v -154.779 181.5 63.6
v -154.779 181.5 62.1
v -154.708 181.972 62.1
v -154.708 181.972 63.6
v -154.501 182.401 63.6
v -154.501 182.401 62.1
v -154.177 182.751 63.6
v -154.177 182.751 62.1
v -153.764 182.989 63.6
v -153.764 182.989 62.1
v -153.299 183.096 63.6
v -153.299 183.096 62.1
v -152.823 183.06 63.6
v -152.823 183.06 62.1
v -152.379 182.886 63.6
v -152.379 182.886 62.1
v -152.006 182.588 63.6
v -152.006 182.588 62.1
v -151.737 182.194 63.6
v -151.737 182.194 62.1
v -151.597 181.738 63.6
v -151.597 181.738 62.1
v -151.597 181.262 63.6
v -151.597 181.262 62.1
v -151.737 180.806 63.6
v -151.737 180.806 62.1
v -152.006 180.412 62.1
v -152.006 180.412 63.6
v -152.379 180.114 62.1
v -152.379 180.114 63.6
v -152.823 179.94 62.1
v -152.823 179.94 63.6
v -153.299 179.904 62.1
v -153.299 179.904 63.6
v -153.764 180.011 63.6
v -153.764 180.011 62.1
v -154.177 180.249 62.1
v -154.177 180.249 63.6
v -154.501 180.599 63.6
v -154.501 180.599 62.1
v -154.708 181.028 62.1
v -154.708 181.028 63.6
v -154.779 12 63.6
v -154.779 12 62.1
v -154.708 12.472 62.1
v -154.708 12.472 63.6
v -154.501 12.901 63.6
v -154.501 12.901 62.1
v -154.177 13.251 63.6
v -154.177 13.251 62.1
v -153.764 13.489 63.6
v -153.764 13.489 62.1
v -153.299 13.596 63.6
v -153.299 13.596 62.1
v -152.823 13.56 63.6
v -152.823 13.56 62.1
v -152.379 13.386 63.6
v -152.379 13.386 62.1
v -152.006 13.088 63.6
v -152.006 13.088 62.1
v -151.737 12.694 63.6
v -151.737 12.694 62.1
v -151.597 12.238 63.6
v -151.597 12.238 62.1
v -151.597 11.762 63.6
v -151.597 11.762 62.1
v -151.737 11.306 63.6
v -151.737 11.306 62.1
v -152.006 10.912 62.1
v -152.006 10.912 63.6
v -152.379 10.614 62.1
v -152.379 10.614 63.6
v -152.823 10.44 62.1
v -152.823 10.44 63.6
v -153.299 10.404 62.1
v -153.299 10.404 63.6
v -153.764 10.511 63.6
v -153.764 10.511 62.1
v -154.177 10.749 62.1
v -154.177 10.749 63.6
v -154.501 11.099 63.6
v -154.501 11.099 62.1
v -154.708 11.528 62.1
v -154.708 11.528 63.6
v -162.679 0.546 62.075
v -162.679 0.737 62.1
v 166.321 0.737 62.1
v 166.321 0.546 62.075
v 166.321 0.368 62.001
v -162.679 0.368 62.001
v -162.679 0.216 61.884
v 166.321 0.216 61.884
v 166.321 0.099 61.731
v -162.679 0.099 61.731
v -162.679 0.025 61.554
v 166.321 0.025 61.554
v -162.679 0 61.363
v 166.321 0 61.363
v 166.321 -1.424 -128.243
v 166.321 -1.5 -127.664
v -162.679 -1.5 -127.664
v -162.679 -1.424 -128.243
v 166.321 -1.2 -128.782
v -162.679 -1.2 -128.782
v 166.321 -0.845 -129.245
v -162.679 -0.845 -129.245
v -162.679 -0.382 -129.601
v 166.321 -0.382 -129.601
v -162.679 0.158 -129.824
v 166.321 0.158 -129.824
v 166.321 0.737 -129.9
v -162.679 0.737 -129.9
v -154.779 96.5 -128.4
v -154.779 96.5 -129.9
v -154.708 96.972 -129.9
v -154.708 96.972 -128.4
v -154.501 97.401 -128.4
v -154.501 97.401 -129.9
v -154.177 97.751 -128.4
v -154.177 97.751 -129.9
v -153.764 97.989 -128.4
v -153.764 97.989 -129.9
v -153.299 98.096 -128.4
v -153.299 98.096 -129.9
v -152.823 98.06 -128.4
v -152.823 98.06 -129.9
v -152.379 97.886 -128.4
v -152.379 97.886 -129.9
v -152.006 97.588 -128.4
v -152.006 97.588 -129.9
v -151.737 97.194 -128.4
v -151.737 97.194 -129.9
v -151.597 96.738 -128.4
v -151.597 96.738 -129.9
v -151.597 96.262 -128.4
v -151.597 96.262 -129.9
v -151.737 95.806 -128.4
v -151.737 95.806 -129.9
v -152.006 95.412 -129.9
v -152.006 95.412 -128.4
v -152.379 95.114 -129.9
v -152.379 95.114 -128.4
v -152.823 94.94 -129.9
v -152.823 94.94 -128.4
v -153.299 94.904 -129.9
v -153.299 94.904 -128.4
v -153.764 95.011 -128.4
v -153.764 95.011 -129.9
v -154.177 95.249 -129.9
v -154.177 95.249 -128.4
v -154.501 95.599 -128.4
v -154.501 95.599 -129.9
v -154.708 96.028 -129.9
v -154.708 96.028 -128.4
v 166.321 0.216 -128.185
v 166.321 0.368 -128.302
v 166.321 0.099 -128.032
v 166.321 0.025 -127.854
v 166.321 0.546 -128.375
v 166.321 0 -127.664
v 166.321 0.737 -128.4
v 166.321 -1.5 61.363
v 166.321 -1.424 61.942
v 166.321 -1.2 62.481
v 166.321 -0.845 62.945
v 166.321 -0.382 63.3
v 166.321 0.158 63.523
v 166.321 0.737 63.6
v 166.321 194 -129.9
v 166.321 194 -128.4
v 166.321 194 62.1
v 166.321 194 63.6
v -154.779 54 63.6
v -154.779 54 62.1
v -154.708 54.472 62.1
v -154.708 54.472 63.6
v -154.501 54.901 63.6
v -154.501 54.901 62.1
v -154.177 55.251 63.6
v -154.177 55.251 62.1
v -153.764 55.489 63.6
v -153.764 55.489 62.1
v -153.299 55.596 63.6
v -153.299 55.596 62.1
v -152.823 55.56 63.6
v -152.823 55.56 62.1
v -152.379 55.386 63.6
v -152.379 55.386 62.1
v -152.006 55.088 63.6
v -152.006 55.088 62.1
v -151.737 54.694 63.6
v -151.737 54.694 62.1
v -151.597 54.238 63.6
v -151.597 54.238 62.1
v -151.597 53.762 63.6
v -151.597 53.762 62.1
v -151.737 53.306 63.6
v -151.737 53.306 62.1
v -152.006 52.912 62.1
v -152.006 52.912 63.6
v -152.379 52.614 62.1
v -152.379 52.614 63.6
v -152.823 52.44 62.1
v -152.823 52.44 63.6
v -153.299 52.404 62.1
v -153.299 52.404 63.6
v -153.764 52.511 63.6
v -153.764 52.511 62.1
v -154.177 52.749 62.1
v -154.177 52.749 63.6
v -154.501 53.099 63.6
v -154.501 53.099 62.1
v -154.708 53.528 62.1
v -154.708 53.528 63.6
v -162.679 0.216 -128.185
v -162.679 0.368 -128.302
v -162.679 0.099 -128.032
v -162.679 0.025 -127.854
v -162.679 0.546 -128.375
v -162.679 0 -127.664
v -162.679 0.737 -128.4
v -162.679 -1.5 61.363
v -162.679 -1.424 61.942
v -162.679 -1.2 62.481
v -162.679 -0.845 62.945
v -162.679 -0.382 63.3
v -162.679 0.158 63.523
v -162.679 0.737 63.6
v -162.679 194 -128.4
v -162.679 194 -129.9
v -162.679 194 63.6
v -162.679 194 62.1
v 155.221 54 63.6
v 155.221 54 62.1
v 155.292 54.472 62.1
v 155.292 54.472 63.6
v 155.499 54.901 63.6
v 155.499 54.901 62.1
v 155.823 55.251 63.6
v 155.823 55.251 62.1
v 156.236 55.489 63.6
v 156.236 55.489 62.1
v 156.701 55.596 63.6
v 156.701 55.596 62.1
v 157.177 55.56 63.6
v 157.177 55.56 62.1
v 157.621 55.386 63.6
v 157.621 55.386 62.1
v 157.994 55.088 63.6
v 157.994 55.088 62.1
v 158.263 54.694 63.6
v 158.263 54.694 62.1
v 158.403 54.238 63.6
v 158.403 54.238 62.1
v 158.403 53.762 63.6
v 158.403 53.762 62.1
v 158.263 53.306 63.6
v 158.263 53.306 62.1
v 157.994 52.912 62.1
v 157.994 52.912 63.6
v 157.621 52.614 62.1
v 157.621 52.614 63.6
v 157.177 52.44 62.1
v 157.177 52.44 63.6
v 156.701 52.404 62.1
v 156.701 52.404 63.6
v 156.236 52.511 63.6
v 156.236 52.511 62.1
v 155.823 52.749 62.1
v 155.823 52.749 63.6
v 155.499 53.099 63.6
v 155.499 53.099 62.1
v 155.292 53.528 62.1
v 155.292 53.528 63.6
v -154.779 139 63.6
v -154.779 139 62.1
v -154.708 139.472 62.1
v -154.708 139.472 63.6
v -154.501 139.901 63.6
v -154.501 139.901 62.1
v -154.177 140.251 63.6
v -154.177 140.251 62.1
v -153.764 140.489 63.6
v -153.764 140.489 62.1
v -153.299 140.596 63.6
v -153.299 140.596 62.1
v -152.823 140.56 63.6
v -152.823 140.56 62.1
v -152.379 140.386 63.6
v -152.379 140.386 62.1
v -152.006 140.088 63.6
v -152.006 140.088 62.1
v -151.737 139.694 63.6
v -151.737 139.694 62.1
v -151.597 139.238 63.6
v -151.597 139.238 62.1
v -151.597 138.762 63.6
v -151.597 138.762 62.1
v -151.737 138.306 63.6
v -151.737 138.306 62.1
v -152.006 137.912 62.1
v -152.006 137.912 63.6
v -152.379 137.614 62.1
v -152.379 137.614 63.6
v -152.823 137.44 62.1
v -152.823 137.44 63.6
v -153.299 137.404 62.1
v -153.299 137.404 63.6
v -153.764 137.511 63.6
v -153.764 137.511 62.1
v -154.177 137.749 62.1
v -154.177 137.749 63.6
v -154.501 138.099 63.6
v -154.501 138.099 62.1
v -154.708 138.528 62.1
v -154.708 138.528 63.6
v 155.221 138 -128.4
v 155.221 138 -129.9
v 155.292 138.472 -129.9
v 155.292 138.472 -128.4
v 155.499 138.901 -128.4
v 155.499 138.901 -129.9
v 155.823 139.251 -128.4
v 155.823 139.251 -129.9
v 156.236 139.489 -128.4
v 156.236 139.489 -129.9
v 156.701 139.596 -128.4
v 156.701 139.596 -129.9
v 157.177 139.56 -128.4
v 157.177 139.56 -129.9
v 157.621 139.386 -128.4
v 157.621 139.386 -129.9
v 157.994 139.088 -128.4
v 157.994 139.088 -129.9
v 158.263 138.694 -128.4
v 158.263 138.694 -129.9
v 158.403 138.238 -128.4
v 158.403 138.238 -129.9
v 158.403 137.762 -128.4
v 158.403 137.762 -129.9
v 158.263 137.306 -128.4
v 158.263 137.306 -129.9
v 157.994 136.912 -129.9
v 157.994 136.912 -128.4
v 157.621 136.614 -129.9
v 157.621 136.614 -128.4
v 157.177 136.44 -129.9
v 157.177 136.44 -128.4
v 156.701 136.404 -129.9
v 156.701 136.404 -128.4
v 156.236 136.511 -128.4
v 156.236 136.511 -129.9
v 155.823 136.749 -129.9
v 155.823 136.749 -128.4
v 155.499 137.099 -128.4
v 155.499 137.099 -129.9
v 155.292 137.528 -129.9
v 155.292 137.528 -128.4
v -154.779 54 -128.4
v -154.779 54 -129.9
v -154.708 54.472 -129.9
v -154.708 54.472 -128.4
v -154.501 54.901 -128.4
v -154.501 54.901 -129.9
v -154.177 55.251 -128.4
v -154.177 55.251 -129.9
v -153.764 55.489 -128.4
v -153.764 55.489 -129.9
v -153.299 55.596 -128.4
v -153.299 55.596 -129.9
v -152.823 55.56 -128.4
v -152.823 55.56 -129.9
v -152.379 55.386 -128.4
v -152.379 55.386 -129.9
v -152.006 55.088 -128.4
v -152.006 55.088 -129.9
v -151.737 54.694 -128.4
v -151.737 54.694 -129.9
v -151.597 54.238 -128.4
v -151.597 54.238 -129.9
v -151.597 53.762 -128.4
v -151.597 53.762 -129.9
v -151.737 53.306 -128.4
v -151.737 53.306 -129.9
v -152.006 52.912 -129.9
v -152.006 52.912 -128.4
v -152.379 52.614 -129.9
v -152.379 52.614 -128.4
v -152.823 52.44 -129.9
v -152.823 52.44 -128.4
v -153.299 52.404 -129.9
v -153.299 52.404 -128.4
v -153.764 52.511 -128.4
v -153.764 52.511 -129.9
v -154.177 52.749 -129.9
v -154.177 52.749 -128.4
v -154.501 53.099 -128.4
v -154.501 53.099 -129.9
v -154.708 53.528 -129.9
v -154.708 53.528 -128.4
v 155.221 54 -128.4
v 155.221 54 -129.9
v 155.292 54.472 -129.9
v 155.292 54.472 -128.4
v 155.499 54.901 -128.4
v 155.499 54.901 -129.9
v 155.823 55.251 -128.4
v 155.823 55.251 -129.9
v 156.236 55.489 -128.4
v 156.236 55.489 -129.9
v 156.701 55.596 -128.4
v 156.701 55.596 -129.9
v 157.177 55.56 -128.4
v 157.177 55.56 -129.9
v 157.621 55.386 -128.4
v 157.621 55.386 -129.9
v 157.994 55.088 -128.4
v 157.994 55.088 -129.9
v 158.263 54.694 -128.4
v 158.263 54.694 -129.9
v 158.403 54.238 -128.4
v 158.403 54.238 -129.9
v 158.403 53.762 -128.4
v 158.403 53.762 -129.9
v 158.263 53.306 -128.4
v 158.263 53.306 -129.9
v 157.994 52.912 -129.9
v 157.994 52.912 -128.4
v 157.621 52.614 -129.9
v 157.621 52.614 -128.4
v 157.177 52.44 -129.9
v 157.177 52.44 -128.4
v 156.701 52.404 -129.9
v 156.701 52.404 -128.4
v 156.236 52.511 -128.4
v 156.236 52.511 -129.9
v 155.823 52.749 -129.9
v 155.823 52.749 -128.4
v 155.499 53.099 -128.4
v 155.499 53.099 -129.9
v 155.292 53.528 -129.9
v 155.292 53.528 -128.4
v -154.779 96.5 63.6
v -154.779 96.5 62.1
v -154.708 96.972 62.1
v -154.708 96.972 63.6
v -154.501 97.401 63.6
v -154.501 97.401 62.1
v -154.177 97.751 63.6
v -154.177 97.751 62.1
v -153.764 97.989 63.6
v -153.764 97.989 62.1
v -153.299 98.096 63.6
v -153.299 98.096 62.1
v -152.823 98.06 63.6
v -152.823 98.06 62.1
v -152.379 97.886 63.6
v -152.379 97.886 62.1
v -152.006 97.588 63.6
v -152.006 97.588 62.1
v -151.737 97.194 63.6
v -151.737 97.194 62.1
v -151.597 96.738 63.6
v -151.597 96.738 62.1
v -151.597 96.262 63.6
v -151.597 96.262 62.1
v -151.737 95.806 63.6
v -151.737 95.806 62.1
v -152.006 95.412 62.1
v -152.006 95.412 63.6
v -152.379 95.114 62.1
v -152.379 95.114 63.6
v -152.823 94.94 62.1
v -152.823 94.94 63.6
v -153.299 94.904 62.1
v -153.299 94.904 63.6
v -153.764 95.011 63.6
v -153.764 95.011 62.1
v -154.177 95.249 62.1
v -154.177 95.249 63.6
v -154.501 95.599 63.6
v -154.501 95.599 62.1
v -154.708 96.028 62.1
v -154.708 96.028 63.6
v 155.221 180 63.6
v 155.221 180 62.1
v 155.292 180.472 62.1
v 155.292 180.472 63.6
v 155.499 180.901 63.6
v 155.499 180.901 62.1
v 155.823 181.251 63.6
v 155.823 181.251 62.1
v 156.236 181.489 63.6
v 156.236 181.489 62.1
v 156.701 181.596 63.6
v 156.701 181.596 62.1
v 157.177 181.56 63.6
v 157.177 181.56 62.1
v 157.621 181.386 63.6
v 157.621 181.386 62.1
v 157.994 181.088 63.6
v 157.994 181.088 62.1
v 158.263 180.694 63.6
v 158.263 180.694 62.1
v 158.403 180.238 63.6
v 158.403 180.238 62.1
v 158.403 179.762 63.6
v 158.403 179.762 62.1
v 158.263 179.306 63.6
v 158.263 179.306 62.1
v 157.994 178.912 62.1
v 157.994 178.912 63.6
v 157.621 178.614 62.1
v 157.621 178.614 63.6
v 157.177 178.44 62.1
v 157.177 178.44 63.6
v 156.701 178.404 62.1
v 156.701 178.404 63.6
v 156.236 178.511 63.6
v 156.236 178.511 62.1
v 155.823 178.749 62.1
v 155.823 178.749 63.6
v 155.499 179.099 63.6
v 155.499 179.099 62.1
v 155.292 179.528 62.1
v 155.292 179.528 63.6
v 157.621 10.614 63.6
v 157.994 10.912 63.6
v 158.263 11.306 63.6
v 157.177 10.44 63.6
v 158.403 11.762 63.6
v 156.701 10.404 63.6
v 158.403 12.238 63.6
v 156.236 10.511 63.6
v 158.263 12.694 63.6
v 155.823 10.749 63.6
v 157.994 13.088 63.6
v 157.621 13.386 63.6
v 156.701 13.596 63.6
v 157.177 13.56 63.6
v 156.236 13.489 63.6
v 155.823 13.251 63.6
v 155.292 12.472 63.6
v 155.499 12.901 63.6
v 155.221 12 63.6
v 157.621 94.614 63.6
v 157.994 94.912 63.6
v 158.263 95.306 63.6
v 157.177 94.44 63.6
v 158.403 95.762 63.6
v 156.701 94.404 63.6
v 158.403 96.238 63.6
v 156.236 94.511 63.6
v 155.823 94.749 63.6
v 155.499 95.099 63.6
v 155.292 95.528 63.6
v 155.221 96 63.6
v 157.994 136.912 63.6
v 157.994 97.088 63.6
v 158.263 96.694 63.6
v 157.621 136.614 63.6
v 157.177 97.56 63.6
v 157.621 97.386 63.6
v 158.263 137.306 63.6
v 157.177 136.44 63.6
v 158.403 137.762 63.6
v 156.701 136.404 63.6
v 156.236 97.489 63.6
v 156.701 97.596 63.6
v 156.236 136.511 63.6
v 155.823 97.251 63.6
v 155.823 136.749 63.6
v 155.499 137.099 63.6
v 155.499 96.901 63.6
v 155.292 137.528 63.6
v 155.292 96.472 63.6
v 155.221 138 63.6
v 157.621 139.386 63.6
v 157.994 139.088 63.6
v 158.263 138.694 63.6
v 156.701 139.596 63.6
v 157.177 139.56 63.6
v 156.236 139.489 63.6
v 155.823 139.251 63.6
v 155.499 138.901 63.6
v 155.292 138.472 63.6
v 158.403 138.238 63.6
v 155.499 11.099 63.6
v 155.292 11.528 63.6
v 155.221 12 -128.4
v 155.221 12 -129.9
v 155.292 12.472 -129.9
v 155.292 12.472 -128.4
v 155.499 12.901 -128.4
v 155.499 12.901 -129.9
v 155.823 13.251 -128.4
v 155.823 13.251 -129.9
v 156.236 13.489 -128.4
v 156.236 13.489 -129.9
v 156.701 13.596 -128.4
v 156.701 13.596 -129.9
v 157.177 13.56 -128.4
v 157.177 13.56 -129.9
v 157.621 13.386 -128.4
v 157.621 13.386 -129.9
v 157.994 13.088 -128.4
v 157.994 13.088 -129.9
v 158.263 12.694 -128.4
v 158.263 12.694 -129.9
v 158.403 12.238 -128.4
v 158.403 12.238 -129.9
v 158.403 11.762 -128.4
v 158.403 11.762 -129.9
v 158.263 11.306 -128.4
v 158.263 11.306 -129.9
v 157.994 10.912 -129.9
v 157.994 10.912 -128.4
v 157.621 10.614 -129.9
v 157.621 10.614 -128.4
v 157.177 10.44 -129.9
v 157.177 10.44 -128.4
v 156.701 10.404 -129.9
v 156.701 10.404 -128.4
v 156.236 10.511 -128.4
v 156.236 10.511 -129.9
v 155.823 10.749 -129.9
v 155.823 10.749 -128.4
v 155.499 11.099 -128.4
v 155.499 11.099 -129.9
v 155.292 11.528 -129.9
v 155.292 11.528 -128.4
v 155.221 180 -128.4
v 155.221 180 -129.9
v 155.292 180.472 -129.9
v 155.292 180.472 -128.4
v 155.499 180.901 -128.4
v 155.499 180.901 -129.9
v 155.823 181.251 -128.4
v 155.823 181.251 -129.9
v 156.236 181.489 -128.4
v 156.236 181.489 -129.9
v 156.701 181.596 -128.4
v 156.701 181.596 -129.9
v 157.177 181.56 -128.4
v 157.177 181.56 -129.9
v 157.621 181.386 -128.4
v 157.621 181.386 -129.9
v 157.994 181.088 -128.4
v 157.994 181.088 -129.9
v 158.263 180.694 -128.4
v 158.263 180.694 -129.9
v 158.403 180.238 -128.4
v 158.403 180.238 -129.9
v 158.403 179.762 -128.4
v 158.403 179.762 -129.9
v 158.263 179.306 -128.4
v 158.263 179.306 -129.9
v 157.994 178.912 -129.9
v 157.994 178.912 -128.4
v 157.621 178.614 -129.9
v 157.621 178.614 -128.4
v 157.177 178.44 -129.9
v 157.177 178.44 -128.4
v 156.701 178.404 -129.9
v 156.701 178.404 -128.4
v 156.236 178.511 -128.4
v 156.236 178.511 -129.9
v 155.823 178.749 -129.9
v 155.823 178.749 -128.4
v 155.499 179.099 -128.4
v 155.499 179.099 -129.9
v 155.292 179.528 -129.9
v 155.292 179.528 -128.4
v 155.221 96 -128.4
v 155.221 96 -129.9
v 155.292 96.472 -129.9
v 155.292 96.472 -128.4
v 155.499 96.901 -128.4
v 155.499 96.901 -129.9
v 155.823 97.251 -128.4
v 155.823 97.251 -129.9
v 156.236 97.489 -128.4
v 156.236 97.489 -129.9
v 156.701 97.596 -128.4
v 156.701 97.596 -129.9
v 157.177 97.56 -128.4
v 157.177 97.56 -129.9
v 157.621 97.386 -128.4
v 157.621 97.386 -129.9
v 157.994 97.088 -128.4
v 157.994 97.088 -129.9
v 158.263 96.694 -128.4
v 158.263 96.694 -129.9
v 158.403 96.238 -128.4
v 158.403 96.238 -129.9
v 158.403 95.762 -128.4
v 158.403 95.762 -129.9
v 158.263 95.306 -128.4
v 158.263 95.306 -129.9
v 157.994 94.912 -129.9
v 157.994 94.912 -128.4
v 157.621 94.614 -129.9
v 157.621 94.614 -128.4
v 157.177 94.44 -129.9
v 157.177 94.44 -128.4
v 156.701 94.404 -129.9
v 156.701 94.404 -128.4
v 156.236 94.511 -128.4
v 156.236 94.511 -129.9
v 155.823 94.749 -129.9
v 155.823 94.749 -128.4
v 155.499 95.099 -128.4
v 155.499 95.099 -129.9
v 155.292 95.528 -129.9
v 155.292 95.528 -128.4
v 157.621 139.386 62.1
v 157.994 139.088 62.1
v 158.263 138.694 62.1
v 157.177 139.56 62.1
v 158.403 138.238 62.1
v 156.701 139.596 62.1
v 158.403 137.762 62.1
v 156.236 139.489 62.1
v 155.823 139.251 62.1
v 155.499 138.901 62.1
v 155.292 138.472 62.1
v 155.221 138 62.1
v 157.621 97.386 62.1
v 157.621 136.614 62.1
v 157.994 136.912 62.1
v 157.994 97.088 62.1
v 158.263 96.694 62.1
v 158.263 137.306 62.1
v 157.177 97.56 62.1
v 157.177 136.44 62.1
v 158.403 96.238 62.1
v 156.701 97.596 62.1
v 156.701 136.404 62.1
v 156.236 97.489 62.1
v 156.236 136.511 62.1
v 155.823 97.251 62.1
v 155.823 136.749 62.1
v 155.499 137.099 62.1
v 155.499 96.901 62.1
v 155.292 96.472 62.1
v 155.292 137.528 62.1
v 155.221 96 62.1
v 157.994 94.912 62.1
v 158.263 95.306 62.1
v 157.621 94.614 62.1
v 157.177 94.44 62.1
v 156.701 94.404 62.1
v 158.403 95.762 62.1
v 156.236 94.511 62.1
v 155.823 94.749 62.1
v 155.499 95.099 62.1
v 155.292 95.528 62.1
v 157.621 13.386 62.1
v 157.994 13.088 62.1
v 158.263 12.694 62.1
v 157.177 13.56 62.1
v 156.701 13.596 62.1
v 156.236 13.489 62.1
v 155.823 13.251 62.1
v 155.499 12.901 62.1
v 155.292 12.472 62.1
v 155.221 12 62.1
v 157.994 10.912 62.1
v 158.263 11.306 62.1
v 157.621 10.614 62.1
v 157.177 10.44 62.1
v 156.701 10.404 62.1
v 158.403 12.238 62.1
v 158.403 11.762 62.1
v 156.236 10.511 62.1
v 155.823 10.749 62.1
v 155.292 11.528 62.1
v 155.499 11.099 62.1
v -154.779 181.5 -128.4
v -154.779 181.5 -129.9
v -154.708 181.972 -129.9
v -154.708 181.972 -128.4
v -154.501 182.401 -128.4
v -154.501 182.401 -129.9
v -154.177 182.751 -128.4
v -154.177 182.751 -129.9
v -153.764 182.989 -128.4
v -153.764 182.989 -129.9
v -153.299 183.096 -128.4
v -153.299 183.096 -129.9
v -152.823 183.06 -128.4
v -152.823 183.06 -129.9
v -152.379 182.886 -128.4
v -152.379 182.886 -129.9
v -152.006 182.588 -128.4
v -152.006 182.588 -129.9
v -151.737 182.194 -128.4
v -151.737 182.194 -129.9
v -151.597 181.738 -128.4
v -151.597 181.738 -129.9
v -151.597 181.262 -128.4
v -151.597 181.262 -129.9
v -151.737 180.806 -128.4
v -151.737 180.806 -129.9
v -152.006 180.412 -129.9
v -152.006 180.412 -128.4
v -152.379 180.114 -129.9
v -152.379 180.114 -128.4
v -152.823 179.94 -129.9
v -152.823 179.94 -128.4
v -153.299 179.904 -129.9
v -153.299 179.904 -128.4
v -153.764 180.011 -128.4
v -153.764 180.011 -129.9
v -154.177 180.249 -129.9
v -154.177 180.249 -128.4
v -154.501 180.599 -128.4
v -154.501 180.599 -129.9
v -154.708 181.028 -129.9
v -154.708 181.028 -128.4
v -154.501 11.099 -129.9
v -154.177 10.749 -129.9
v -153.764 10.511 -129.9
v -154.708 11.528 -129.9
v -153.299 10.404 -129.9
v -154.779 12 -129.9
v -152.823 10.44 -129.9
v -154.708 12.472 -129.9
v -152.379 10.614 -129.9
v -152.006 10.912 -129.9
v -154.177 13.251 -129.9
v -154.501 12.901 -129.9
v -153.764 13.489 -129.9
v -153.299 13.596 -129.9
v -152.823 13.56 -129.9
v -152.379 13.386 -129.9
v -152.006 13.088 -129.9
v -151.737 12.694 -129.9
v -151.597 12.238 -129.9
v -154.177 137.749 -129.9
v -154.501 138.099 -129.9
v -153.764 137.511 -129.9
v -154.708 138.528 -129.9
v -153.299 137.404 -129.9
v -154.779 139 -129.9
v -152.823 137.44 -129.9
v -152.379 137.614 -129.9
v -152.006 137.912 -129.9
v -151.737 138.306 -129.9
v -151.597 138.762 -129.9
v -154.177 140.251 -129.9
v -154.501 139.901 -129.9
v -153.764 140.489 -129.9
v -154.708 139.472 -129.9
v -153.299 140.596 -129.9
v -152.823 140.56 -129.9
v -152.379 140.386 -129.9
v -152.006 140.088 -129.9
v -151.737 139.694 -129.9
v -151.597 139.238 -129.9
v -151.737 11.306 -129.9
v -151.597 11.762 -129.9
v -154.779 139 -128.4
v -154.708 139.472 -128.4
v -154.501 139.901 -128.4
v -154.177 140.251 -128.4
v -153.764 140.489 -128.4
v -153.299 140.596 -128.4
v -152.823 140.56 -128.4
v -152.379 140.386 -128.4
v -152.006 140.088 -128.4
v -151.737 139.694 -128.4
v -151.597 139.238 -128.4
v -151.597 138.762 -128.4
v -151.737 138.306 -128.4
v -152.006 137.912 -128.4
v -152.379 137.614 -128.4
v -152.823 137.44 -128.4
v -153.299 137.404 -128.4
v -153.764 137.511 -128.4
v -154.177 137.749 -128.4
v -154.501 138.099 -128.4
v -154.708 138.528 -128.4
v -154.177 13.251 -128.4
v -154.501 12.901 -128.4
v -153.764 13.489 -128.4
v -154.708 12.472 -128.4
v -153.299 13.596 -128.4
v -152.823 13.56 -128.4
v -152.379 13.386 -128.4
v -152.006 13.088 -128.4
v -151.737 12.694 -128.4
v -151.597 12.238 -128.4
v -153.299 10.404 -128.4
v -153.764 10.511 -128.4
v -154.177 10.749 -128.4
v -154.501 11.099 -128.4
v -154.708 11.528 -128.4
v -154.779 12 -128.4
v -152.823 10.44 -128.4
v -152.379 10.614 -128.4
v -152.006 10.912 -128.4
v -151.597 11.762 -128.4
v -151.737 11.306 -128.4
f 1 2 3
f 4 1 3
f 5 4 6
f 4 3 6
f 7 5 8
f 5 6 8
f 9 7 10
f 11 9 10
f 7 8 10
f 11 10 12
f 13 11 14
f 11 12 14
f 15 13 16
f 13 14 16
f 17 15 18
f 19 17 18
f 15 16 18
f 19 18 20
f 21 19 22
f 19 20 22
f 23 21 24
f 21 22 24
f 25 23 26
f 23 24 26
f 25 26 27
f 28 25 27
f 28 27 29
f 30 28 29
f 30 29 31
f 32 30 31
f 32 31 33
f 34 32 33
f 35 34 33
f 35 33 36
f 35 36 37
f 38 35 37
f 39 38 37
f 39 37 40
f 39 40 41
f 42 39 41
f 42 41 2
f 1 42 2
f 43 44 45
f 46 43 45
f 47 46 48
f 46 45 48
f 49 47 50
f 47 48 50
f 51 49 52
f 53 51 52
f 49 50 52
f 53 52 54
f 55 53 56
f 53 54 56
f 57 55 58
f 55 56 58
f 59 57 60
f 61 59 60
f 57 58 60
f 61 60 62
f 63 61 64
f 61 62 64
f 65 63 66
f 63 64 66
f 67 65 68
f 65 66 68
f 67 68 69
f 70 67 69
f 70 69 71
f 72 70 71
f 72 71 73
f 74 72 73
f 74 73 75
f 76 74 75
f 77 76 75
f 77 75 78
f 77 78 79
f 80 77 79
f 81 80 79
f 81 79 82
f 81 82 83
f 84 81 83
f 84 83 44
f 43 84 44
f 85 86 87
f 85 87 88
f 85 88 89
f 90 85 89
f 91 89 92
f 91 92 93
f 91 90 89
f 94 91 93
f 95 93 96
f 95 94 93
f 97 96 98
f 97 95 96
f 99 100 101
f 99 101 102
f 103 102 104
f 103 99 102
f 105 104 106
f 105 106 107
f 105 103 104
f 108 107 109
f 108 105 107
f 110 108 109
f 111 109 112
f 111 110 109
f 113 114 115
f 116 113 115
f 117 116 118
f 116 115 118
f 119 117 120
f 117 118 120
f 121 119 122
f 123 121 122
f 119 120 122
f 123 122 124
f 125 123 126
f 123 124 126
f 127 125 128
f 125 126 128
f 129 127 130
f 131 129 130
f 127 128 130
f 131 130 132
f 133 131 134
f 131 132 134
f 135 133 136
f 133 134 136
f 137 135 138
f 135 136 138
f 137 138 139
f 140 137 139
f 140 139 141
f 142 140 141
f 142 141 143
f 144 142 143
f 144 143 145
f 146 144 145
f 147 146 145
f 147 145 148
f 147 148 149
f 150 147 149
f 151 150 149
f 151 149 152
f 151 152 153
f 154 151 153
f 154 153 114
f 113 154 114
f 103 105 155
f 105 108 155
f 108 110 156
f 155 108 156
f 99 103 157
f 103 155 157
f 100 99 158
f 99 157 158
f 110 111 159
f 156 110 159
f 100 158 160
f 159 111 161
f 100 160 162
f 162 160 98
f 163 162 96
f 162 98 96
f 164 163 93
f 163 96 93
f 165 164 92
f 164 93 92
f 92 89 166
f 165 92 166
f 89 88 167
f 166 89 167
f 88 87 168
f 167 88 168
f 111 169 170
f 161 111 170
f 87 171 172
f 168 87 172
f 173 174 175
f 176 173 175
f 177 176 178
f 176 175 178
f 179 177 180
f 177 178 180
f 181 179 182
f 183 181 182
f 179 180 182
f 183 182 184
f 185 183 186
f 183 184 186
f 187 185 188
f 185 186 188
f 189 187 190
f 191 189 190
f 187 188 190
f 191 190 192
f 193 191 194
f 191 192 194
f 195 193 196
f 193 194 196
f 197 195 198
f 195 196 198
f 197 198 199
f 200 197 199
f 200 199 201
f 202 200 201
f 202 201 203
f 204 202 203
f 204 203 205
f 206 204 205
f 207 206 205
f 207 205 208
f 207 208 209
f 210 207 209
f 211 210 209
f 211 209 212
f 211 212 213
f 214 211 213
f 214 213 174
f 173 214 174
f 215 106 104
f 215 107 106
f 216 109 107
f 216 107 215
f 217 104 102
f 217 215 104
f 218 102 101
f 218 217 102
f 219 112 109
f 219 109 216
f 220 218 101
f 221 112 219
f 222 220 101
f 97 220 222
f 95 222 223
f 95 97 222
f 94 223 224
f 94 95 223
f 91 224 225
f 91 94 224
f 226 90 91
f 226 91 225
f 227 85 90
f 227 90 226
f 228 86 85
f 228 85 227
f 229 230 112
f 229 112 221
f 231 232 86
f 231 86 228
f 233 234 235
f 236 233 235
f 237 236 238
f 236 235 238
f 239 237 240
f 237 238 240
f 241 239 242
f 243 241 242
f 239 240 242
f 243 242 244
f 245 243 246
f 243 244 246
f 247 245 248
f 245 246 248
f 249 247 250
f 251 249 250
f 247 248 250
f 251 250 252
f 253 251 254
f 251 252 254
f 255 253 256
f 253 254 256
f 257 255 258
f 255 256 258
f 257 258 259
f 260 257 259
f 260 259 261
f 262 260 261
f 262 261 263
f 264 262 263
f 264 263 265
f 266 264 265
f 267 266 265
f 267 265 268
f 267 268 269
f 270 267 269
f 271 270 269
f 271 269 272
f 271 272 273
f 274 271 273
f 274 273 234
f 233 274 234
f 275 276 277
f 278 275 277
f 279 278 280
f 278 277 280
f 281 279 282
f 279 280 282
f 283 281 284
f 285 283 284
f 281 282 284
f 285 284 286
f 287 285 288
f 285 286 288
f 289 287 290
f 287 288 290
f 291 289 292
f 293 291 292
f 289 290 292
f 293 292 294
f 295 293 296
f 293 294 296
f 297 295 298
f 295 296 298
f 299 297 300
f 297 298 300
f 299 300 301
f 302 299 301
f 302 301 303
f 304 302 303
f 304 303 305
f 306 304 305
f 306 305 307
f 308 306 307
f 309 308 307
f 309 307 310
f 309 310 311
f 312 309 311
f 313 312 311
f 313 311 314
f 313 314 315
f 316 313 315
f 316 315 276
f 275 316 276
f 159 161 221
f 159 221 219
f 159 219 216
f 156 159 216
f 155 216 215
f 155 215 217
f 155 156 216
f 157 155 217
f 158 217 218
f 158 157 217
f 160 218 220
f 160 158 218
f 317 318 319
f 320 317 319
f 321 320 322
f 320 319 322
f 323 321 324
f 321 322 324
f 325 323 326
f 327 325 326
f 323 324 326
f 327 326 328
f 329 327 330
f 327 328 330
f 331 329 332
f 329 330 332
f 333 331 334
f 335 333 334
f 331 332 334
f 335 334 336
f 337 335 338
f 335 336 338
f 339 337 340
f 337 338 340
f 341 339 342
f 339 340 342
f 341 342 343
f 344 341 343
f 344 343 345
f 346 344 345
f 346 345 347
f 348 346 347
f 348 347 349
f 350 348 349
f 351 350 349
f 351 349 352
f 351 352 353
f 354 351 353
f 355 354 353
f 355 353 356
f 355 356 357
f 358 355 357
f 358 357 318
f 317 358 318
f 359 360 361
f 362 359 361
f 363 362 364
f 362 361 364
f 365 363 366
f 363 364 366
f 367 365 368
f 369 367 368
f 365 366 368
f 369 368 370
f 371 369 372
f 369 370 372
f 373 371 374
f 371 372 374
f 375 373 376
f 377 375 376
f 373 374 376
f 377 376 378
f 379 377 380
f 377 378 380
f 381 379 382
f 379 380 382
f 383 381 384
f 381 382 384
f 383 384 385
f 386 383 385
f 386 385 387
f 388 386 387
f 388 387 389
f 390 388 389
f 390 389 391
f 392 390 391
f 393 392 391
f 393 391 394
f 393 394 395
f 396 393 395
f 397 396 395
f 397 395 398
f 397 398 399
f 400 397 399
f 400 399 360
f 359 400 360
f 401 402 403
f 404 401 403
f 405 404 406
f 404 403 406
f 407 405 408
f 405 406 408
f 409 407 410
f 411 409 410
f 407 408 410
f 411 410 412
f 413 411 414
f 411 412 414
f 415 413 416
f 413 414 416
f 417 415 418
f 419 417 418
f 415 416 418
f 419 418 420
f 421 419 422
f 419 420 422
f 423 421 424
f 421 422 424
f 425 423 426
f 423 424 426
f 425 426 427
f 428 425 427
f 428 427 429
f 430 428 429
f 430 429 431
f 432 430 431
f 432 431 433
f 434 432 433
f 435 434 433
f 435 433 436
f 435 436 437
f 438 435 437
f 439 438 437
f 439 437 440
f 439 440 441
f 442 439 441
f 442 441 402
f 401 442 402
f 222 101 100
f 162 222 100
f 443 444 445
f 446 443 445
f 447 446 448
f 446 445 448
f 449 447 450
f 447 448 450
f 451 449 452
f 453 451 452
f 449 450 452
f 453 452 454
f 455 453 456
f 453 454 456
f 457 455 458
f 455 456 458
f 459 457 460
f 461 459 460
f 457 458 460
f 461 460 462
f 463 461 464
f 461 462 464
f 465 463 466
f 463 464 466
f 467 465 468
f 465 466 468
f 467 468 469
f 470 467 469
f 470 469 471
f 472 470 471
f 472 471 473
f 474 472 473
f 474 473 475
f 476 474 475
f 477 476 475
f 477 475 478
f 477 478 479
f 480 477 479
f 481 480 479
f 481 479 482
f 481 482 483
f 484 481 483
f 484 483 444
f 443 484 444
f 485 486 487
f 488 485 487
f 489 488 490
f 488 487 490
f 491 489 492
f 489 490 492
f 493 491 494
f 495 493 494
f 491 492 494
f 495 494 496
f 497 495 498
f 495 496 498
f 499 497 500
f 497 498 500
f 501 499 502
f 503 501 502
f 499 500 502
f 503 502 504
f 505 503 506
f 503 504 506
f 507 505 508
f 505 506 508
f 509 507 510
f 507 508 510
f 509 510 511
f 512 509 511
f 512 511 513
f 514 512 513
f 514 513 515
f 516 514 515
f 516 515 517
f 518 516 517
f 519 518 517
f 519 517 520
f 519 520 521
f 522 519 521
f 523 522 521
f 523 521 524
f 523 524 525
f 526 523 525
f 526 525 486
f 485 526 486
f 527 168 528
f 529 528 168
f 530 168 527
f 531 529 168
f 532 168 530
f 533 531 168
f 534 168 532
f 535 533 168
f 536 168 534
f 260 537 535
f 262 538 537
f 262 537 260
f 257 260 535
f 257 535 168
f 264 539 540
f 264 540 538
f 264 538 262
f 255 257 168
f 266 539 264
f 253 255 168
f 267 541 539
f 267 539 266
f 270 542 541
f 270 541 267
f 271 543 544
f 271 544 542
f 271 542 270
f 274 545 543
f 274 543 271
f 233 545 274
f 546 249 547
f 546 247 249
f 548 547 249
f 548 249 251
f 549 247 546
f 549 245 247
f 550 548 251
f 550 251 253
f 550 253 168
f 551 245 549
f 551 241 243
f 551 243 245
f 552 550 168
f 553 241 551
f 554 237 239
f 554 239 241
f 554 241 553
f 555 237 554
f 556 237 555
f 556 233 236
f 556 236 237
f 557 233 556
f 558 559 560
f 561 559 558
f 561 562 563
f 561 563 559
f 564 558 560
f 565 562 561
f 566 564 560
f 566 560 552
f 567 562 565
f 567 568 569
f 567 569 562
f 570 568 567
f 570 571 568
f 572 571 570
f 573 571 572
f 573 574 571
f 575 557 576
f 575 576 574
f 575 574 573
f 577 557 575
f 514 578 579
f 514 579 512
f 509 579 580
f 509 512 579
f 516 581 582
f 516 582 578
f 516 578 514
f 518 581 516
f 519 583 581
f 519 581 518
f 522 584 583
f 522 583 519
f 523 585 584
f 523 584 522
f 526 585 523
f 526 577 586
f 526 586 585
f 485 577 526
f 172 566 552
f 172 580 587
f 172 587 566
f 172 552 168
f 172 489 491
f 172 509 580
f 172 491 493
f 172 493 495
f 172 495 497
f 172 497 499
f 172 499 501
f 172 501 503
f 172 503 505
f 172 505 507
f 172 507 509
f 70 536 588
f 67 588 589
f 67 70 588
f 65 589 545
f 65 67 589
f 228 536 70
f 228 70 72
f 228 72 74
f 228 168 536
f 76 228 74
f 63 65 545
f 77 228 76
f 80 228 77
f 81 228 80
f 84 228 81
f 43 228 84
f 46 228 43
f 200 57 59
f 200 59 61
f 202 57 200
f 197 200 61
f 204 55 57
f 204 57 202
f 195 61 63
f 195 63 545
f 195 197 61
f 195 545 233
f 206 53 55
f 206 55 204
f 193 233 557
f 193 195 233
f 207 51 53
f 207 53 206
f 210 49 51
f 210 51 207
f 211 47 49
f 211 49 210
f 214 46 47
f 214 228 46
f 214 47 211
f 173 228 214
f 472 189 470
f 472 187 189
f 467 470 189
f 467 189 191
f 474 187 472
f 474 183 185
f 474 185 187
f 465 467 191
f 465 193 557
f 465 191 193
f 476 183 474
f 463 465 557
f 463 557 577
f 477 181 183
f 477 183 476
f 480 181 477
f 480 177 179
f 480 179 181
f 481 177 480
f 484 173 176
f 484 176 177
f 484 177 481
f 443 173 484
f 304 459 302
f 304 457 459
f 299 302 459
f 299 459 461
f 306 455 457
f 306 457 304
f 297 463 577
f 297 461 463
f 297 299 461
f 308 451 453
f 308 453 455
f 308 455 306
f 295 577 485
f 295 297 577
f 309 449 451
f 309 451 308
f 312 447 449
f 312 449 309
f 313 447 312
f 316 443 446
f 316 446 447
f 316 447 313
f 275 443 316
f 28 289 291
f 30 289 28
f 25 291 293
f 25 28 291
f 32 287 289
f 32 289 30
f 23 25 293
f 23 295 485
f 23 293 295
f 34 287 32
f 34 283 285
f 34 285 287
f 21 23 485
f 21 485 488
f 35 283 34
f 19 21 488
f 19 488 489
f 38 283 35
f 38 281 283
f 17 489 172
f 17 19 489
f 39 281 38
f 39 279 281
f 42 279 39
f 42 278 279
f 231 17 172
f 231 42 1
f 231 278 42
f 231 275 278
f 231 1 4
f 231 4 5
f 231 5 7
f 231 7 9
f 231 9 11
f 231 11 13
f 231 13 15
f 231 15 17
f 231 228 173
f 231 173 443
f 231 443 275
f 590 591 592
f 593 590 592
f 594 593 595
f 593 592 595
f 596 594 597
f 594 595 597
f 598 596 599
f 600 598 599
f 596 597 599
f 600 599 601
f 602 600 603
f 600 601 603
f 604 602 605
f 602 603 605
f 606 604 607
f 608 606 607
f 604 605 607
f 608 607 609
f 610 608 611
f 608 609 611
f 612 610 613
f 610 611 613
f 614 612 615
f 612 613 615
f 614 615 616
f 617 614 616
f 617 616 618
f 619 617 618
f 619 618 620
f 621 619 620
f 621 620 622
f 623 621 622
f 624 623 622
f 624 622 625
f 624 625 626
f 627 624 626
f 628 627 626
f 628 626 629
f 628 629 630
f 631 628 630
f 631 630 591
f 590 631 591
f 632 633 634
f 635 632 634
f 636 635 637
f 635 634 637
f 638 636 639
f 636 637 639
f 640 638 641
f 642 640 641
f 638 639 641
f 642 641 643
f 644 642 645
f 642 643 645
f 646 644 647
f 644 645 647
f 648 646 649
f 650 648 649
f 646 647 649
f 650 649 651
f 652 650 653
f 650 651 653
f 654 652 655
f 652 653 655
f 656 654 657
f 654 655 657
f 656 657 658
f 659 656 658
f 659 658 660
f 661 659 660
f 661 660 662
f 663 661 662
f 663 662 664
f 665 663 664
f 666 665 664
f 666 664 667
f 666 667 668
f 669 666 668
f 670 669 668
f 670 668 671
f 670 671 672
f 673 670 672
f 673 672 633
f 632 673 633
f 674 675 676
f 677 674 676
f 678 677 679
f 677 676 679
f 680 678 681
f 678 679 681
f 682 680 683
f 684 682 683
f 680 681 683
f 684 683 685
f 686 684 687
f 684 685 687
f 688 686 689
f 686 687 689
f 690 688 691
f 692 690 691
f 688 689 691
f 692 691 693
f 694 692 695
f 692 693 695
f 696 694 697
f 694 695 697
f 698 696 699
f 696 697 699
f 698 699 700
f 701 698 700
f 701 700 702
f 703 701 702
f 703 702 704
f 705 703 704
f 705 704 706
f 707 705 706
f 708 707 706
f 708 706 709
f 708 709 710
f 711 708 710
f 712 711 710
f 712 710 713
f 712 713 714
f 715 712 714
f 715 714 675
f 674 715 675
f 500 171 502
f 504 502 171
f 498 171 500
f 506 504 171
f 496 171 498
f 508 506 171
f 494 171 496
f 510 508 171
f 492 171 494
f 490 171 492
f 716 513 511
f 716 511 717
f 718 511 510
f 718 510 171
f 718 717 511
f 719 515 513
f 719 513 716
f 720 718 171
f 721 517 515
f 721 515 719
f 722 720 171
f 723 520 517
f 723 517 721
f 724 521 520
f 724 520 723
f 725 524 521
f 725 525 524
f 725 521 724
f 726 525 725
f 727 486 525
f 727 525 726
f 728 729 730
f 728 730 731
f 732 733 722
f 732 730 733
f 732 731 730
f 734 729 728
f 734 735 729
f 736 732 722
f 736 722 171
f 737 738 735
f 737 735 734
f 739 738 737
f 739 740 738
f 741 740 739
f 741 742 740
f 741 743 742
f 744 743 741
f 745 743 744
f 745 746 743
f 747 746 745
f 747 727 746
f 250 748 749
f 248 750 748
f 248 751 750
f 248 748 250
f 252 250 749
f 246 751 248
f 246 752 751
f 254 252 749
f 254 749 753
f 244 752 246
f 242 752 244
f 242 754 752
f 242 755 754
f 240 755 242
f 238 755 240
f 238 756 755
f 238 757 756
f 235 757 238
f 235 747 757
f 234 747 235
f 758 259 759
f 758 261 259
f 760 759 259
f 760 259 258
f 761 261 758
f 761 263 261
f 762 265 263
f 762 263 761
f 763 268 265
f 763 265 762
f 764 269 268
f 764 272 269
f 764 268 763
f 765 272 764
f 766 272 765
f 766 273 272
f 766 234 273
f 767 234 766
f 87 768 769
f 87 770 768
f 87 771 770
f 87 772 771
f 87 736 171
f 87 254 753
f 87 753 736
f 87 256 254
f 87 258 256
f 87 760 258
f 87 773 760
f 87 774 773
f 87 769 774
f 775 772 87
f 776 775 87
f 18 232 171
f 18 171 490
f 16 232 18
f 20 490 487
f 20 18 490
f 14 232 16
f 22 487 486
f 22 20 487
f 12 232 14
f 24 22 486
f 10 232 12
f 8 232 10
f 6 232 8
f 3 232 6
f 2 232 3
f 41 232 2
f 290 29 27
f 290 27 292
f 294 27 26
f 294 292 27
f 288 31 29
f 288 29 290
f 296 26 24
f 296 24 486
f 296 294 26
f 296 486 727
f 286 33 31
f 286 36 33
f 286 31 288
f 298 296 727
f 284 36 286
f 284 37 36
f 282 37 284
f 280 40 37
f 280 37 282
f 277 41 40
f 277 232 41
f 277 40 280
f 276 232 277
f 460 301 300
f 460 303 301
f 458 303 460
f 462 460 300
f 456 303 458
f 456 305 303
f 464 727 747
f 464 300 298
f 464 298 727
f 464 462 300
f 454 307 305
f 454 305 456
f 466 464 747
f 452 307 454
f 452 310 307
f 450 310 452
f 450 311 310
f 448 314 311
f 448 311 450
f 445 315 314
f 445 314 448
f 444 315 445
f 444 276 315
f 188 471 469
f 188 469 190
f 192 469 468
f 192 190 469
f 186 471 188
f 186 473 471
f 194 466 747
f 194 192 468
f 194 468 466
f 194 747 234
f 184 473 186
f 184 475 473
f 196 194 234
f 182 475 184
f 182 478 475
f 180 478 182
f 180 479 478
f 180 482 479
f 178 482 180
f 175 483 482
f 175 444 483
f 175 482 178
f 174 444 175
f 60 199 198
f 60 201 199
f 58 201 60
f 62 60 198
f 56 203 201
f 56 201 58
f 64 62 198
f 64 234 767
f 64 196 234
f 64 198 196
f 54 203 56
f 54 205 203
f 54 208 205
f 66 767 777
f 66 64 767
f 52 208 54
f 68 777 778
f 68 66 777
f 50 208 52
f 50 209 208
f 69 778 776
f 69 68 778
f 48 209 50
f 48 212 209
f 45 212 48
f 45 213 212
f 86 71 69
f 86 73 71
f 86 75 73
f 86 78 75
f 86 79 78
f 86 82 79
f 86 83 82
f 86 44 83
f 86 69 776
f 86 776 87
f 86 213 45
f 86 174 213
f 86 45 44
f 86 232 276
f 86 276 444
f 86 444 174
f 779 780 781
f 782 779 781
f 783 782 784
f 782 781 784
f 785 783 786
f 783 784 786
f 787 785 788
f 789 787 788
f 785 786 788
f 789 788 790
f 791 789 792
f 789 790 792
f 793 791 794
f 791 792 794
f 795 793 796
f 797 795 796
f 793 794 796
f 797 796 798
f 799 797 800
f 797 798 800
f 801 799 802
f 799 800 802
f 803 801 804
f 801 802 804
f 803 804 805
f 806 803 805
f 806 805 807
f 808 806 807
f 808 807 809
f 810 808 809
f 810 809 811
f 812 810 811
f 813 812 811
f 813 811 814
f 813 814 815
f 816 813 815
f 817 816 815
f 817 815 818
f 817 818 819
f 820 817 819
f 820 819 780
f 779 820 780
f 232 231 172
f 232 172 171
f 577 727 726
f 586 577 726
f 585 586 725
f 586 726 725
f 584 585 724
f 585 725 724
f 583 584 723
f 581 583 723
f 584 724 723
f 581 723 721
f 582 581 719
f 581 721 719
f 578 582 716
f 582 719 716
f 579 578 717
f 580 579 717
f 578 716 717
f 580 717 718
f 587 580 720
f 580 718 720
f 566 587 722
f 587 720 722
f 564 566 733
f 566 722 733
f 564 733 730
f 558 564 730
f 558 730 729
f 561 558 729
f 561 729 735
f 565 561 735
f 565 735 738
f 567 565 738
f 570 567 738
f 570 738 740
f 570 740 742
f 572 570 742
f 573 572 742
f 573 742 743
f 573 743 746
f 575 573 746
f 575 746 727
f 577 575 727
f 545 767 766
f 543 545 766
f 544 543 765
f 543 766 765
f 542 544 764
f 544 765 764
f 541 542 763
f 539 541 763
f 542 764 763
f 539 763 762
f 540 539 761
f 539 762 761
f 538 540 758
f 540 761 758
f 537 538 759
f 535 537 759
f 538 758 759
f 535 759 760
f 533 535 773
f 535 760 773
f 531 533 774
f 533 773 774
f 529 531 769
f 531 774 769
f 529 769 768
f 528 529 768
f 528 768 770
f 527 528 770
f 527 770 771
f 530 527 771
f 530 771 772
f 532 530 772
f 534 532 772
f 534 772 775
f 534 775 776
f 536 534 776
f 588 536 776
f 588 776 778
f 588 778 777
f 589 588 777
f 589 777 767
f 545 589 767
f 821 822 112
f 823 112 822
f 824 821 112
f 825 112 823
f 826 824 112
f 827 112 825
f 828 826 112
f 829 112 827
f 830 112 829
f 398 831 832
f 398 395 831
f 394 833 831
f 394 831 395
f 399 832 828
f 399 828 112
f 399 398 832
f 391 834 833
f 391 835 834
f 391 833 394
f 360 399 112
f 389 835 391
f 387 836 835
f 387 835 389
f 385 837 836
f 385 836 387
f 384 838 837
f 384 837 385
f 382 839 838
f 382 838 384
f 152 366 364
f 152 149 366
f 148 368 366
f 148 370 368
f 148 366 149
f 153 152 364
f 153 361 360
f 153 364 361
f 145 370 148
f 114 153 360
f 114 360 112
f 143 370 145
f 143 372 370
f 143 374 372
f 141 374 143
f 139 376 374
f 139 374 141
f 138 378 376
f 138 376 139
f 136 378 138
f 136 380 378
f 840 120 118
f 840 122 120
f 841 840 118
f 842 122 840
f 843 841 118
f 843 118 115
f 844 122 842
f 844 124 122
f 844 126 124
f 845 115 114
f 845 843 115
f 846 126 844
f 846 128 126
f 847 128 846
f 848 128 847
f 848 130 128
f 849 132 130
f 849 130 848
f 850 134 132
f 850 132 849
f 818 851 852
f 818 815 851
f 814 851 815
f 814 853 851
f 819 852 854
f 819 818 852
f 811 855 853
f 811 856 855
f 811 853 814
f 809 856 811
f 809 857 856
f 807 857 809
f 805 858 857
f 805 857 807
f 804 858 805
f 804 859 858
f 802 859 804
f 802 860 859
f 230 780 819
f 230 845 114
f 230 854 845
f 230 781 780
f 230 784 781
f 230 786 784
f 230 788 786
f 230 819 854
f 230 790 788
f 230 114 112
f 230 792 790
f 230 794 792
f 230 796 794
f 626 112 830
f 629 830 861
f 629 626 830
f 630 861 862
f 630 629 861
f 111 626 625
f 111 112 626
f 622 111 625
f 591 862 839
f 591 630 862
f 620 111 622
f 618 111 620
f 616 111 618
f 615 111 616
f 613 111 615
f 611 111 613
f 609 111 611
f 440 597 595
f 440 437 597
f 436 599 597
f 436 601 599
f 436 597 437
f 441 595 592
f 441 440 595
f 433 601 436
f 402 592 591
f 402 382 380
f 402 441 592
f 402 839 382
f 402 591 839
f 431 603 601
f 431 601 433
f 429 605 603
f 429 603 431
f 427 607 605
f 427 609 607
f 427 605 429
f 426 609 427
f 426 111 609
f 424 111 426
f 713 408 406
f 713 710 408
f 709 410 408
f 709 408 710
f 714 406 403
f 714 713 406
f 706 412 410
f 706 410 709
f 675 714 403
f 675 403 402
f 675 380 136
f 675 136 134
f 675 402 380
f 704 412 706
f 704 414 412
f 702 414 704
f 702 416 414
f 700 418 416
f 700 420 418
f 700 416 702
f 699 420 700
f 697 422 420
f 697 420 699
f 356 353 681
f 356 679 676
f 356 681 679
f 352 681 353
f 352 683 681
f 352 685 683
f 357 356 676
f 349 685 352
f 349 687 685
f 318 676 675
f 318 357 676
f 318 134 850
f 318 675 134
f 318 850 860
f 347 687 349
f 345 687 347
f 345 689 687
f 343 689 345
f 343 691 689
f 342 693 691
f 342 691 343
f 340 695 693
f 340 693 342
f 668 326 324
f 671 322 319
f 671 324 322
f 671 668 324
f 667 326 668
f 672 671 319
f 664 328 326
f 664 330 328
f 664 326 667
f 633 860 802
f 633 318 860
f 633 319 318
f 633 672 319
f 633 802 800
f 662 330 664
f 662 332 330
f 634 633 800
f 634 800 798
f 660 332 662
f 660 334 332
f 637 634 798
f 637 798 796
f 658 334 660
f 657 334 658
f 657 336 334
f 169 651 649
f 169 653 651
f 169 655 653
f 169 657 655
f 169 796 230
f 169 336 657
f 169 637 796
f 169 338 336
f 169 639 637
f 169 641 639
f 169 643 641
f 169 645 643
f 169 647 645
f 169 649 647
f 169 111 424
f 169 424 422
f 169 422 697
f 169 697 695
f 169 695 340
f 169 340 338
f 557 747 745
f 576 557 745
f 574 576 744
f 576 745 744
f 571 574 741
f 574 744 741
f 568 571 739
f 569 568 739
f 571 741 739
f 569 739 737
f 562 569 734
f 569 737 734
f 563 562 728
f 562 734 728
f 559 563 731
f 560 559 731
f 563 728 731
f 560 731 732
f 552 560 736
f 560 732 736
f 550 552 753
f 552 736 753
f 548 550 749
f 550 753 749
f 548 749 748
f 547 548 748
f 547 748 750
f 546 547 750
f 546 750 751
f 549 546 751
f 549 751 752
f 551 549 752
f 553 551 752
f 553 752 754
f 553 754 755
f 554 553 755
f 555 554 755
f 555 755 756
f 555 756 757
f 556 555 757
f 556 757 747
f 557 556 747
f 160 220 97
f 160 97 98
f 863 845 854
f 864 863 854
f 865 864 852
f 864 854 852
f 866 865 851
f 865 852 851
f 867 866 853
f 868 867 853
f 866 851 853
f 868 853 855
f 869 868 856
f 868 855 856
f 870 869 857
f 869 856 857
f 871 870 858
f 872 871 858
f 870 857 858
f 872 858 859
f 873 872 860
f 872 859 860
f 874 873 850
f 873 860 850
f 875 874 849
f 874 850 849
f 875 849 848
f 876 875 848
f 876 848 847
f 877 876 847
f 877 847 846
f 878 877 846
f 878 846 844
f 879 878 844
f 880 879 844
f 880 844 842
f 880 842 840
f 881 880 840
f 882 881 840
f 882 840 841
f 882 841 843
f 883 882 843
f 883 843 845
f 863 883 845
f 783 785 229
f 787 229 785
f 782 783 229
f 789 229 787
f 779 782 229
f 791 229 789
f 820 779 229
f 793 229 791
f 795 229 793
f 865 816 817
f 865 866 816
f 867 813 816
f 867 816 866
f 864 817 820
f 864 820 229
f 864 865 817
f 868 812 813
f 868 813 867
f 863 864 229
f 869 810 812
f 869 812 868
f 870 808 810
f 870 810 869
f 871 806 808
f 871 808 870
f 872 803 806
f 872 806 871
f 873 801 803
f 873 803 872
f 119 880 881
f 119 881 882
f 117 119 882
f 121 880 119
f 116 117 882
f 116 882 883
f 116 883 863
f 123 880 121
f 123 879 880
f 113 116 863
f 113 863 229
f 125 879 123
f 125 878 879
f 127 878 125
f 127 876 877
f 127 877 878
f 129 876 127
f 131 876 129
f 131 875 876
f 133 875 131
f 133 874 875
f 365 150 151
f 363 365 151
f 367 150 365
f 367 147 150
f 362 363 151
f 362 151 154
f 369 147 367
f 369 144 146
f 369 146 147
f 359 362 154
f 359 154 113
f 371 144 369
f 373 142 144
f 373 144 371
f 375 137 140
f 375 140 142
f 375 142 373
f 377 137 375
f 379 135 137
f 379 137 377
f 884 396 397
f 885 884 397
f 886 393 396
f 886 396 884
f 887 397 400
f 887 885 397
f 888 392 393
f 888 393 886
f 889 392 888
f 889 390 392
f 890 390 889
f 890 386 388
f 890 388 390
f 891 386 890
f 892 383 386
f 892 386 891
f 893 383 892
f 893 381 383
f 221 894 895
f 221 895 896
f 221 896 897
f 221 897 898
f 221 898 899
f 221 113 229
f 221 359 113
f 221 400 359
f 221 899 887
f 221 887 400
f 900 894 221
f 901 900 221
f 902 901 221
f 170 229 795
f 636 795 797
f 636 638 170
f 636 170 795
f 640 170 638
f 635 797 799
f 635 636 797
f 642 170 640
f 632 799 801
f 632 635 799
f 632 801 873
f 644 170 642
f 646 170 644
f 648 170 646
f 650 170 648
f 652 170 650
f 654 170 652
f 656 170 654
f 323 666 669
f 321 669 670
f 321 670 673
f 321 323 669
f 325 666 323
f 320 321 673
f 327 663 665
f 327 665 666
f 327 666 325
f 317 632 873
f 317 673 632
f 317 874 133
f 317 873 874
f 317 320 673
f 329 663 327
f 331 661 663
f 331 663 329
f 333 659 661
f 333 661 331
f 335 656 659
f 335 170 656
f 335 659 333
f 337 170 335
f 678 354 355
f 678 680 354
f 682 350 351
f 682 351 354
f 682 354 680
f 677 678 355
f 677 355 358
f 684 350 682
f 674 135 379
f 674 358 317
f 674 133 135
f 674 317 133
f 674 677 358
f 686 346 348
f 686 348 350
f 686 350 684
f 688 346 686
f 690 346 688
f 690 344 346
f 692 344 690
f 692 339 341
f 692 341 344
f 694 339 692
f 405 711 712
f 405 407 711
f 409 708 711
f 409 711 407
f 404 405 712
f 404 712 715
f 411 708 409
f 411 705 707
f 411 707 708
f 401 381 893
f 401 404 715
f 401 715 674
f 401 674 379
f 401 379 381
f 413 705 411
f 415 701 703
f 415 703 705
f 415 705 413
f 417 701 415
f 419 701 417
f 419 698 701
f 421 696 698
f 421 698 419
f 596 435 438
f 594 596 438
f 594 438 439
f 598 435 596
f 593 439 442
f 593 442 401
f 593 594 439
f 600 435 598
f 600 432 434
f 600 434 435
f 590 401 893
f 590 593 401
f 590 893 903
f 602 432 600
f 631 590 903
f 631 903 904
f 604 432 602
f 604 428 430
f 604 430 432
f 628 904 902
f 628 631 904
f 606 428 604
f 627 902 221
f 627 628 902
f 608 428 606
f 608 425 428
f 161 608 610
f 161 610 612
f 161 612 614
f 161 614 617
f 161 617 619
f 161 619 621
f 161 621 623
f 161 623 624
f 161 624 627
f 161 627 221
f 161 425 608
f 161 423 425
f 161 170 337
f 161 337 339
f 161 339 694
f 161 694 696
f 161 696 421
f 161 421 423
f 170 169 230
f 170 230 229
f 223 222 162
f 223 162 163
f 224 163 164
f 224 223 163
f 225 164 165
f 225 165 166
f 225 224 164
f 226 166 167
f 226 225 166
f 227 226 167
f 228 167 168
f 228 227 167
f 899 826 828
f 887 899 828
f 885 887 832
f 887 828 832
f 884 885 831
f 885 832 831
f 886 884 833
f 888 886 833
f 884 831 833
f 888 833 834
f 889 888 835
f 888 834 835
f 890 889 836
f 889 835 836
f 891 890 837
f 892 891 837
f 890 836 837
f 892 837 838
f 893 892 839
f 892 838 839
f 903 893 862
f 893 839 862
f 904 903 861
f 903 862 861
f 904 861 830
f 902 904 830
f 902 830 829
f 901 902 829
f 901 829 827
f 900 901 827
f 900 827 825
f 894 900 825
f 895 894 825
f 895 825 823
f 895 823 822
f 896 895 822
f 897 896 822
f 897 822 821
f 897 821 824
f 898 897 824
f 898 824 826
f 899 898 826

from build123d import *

# Parameters (mm, degrees)
SKETCH_1_W                         = 329
SKETCH_1_H                         = 193.5
SM_BASE_FLANGE_1_DEPTH             = 1.5
SM_EDGE_FLANGE_1_STRIP_W           = 7.4732
SM_EDGE_FLANGE_1_STRIP_H           = 1.5
SM_EDGE_FLANGE_1_STRIP_CUT_DEPTH   = 329
SM_EDGE_FLANGE_1_STRIP_2_W         = 7.4732
SM_EDGE_FLANGE_1_STRIP_2_H         = 1.5
SM_EDGE_FLANGE_1_STRIP_CUT_2_DEPTH = 329
SM_EDGE_FLANGE_1_DEPTH             = 329
SM_EDGE_FLANGE_1_BEND_DEPTH        = 329
SKETCH_21_R                        = 1.6
CUT_EXTRUDE_2_DEPTH                = 217


# Sheet-metal steps are written as plain solids
with BuildPart() as part:
    # Sketch 1 → Базовая кромка1 (new body)
    with BuildSketch(Plane(origin=(0, 0, 0), x_dir=(1, 0, 0), z_dir=(0, 1, 0))):
        with Locations((1.82103321, 33.150369004)):
            Rectangle(SKETCH_1_W, SKETCH_1_H)
    extrude(amount=-SM_BASE_FLANGE_1_DEPTH)

    # Ребро-кромка1 strip (across the edge) → Ребро-кромка1 strip cut (cut)
    with BuildSketch(Plane(origin=(166.32103321, 0, -129.900369004), x_dir=(0, 0, 1), z_dir=(-1, 0, 0))):
        with Locations((-1.5, -0.75)):
            Rectangle(SM_EDGE_FLANGE_1_STRIP_W, SM_EDGE_FLANGE_1_STRIP_H)
    extrude(amount=SM_EDGE_FLANGE_1_STRIP_CUT_DEPTH, mode=Mode.SUBTRACT)

    # Ребро-кромка1 strip 2 (across the edge) → Ребро-кромка1 strip cut 2 (cut)
    with BuildSketch(Plane(origin=(-162.67896679, 0, 63.599630996), x_dir=(0, 0, -1), z_dir=(1, 0, 0))):
        with Locations((-1.5, -0.75)):
            Rectangle(SM_EDGE_FLANGE_1_STRIP_2_W, SM_EDGE_FLANGE_1_STRIP_2_H)
    extrude(amount=SM_EDGE_FLANGE_1_STRIP_CUT_2_DEPTH, mode=Mode.SUBTRACT)

    # Ребро-кромка1 section (across the edge) → Ребро-кромка1 (add)
    with BuildSketch(Plane(origin=(166.32103321, 0, -129.900369004), x_dir=(0, 0, 1), z_dir=(-1, 0, 0))):
        with BuildLine():
            Line((0, 0.7366), (0, 194))
            Line((0, 194), (1.5, 194))
            Line((1.5, 194), (1.5, 0.7366))
            ThreePointArc((1.5, 0.7366), (1.715745145, 0.215745145), (2.2366, 0))
            Line((2.2366, 0), (2.2366, -1.5))
            ThreePointArc((2.2366, -1.5), (0.655084973, -0.844915027), (0, 0.7366))
        make_face()
    extrude(amount=SM_EDGE_FLANGE_1_DEPTH)

    # Ребро-кромка1 section 2 (across the edge) → Ребро-кромка1 bend (add)
    with BuildSketch(Plane(origin=(-162.67896679, 0, 63.599630996), x_dir=(0, 0, -1), z_dir=(1, 0, 0))):
        with BuildLine():
            Line((0, 0.7366), (0, 194))
            Line((0, 194), (1.5, 194))
            Line((1.5, 194), (1.5, 0.7366))
            ThreePointArc((1.5, 0.7366), (1.715745145, 0.215745145), (2.2366, 0))
            Line((2.2366, 0), (2.2366, -1.5))
            ThreePointArc((2.2366, -1.5), (0.655084973, -0.844915027), (0, 0.7366))
        make_face()
    extrude(amount=SM_EDGE_FLANGE_1_BEND_DEPTH)

    # Эскиз21 → Вырез-Вытянуть2 (cut)
    with BuildSketch(Plane(origin=(0, 0, -129.900369004), x_dir=(-1, 0, 0), z_dir=(0, 0, -1))):
        with Locations((-156.82103321, 12)):
            Circle(SKETCH_21_R)
        with Locations((-156.82103321, 54)):
            Circle(SKETCH_21_R)
        with Locations((-156.82103321, 96)):
            Circle(SKETCH_21_R)
        with Locations((-156.82103321, 138)):
            Circle(SKETCH_21_R)
        with Locations((-156.82103321, 180)):
            Circle(SKETCH_21_R)
        with Locations((153.17896679, 181.5)):
            Circle(SKETCH_21_R)
        with Locations((153.17896679, 139)):
            Circle(SKETCH_21_R)
        with Locations((153.17896679, 96.5)):
            Circle(SKETCH_21_R)
        with Locations((153.17896679, 54)):
            Circle(SKETCH_21_R)
        with Locations((153.17896679, 12)):
            Circle(SKETCH_21_R)
    extrude(amount=-CUT_EXTRUDE_2_DEPTH, mode=Mode.SUBTRACT)


solid = part.part
